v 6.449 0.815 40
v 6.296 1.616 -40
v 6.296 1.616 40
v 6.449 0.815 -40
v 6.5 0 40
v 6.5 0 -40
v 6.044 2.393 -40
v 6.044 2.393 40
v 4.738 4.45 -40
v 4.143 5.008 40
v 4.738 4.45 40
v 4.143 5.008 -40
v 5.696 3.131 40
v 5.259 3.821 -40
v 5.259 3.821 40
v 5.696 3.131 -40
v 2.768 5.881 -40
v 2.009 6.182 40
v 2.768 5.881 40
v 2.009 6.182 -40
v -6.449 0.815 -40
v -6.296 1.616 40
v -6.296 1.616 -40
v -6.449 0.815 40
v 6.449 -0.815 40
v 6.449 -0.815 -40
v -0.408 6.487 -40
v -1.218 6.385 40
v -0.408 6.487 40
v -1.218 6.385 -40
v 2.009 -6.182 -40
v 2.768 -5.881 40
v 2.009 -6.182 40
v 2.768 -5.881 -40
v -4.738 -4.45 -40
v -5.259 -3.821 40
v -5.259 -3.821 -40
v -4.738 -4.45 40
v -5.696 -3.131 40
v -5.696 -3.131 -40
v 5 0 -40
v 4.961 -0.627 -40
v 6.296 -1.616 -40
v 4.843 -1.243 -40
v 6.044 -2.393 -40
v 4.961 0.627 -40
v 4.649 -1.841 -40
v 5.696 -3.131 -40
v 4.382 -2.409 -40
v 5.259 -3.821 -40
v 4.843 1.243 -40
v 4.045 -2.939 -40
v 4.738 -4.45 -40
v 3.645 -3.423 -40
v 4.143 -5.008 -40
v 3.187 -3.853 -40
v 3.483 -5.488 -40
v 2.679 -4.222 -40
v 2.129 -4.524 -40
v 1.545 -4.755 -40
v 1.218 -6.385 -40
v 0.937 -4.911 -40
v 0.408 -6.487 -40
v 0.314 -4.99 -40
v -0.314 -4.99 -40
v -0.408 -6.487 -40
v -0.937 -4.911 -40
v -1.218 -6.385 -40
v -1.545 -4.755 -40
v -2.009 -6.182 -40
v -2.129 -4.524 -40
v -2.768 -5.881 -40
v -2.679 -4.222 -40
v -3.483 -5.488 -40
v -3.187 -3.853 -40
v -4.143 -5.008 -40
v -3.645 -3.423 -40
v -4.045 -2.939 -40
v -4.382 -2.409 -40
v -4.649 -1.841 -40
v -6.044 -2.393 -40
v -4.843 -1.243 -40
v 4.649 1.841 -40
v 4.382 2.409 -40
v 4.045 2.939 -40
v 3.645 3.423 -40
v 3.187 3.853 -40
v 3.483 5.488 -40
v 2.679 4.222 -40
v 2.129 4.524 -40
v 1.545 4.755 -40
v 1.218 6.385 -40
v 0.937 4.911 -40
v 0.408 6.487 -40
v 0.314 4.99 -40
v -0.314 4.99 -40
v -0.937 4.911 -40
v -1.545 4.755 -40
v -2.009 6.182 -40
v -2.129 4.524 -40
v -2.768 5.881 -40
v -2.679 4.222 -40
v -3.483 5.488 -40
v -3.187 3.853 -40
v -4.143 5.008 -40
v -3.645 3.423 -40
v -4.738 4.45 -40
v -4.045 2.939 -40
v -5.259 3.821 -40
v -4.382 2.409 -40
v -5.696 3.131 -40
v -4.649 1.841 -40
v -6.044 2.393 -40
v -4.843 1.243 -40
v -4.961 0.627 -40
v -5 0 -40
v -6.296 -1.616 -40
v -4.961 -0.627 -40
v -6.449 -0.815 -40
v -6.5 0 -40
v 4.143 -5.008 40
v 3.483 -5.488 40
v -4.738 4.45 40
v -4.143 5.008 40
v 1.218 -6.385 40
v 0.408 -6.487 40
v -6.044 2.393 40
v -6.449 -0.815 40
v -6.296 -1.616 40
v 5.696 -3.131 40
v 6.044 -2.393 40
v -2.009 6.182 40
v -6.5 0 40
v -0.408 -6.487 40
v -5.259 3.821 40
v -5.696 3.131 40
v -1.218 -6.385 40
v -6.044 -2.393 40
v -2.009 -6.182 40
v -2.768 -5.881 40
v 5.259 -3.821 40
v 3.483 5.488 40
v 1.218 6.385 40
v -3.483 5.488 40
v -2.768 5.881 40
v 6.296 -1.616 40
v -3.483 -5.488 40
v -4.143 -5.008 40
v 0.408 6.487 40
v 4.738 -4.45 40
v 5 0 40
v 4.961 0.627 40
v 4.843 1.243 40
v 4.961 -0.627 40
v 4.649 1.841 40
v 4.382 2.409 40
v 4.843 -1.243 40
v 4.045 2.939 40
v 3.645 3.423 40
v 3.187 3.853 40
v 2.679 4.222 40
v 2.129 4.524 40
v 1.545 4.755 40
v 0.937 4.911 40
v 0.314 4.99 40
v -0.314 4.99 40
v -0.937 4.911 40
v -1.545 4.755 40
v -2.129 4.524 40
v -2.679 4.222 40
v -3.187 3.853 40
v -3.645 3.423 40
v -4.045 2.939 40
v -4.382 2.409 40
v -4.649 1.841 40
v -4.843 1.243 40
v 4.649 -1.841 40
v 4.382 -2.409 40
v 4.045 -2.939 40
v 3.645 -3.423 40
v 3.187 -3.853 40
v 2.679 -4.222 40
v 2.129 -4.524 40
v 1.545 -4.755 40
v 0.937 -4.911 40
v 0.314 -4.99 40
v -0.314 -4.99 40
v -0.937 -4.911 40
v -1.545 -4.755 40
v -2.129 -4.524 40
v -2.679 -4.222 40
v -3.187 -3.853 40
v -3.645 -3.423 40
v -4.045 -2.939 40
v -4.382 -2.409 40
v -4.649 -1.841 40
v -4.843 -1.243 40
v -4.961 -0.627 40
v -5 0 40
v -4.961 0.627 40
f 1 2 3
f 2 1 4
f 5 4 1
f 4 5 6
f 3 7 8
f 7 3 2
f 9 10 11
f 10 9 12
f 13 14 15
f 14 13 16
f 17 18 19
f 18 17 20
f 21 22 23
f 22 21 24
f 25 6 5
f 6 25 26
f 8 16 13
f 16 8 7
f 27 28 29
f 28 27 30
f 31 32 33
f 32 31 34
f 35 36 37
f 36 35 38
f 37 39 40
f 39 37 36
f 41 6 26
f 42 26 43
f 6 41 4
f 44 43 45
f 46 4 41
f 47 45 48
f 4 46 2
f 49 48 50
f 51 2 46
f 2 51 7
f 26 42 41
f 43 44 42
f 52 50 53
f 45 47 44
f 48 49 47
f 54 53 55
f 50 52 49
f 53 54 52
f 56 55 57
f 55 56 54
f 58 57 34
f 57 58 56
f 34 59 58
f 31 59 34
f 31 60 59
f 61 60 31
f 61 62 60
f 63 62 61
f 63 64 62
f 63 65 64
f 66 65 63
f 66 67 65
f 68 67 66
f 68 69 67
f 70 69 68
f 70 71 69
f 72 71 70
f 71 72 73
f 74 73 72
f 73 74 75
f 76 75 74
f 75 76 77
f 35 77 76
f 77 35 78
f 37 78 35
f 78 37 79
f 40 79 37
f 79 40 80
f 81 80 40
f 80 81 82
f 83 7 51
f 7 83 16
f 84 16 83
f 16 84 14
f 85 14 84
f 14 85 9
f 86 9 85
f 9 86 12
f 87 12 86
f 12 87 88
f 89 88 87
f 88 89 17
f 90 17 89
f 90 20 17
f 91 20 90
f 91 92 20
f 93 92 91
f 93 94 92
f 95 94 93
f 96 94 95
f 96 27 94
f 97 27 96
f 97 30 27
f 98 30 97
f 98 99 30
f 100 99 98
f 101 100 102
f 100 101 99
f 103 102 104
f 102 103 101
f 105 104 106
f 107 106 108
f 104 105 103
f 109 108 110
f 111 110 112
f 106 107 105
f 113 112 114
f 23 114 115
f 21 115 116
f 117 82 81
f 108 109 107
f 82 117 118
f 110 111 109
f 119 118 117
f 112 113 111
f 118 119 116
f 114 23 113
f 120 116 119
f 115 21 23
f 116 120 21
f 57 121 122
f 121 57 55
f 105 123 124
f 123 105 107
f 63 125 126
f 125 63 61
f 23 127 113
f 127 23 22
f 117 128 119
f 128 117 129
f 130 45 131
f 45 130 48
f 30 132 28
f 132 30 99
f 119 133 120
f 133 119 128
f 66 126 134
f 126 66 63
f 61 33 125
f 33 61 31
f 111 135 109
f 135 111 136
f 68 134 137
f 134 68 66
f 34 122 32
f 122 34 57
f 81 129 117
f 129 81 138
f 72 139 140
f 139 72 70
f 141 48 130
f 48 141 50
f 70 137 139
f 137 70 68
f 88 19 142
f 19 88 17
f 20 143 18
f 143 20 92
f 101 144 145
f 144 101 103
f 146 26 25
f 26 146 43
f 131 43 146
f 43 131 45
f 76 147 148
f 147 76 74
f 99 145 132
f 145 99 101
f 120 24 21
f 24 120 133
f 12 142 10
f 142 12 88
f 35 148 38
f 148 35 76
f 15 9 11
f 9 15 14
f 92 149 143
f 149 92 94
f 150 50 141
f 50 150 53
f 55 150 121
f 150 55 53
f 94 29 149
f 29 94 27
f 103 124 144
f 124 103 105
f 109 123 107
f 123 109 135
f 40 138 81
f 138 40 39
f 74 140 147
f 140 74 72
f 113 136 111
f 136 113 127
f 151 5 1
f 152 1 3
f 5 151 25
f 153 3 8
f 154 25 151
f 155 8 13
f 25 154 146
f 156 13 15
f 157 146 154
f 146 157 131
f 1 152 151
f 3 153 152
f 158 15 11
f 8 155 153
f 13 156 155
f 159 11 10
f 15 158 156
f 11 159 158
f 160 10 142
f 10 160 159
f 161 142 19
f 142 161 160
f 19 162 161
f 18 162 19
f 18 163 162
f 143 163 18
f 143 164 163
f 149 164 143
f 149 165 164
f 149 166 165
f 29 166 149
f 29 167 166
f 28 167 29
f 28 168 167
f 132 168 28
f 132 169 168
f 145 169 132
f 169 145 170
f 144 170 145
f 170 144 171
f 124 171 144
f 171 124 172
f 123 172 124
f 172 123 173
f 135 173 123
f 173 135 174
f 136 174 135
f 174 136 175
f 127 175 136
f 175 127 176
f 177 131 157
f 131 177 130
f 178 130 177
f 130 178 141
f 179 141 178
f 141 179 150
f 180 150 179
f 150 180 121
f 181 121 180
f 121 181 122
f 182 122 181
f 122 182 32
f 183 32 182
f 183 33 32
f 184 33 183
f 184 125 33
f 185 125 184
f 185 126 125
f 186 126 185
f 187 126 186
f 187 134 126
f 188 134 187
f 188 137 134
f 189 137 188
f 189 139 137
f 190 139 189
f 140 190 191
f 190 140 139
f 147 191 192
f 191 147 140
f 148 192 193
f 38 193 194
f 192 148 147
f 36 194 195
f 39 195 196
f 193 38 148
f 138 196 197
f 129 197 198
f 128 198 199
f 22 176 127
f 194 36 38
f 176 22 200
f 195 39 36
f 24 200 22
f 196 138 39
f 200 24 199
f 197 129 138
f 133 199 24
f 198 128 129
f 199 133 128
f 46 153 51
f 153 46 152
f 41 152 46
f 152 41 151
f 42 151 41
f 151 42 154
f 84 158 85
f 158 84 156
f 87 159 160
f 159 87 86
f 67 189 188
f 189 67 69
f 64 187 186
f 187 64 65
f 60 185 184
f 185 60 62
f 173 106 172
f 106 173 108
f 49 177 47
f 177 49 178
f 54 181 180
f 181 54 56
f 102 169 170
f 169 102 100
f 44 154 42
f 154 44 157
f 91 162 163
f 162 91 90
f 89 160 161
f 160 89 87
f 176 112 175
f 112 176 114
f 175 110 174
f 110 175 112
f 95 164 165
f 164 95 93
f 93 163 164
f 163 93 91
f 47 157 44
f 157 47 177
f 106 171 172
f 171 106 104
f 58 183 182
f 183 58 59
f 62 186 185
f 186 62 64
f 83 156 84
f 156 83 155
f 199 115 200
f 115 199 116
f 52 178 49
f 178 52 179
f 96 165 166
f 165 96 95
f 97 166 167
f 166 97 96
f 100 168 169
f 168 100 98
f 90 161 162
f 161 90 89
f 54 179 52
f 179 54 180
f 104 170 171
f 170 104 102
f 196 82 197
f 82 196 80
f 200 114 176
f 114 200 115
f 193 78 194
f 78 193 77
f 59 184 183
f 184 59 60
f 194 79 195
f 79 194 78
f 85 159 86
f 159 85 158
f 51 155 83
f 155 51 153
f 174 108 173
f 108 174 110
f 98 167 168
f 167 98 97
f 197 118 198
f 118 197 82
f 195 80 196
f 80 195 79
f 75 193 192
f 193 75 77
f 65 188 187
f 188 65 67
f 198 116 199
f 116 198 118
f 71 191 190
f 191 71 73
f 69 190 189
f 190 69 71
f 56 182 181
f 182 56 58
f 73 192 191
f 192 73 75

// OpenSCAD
$fn = 50;


difference() {
	union() {
		translate(v = [0, 0, -40.0000000000]) {
			cylinder(h = 80, r = 6.5000000000);
		}
	}
	union() {
		translate(v = [0, 0, -100.0000000000]) {
			cylinder(h = 200, r = 5.0000000000);
		}
	}
}
